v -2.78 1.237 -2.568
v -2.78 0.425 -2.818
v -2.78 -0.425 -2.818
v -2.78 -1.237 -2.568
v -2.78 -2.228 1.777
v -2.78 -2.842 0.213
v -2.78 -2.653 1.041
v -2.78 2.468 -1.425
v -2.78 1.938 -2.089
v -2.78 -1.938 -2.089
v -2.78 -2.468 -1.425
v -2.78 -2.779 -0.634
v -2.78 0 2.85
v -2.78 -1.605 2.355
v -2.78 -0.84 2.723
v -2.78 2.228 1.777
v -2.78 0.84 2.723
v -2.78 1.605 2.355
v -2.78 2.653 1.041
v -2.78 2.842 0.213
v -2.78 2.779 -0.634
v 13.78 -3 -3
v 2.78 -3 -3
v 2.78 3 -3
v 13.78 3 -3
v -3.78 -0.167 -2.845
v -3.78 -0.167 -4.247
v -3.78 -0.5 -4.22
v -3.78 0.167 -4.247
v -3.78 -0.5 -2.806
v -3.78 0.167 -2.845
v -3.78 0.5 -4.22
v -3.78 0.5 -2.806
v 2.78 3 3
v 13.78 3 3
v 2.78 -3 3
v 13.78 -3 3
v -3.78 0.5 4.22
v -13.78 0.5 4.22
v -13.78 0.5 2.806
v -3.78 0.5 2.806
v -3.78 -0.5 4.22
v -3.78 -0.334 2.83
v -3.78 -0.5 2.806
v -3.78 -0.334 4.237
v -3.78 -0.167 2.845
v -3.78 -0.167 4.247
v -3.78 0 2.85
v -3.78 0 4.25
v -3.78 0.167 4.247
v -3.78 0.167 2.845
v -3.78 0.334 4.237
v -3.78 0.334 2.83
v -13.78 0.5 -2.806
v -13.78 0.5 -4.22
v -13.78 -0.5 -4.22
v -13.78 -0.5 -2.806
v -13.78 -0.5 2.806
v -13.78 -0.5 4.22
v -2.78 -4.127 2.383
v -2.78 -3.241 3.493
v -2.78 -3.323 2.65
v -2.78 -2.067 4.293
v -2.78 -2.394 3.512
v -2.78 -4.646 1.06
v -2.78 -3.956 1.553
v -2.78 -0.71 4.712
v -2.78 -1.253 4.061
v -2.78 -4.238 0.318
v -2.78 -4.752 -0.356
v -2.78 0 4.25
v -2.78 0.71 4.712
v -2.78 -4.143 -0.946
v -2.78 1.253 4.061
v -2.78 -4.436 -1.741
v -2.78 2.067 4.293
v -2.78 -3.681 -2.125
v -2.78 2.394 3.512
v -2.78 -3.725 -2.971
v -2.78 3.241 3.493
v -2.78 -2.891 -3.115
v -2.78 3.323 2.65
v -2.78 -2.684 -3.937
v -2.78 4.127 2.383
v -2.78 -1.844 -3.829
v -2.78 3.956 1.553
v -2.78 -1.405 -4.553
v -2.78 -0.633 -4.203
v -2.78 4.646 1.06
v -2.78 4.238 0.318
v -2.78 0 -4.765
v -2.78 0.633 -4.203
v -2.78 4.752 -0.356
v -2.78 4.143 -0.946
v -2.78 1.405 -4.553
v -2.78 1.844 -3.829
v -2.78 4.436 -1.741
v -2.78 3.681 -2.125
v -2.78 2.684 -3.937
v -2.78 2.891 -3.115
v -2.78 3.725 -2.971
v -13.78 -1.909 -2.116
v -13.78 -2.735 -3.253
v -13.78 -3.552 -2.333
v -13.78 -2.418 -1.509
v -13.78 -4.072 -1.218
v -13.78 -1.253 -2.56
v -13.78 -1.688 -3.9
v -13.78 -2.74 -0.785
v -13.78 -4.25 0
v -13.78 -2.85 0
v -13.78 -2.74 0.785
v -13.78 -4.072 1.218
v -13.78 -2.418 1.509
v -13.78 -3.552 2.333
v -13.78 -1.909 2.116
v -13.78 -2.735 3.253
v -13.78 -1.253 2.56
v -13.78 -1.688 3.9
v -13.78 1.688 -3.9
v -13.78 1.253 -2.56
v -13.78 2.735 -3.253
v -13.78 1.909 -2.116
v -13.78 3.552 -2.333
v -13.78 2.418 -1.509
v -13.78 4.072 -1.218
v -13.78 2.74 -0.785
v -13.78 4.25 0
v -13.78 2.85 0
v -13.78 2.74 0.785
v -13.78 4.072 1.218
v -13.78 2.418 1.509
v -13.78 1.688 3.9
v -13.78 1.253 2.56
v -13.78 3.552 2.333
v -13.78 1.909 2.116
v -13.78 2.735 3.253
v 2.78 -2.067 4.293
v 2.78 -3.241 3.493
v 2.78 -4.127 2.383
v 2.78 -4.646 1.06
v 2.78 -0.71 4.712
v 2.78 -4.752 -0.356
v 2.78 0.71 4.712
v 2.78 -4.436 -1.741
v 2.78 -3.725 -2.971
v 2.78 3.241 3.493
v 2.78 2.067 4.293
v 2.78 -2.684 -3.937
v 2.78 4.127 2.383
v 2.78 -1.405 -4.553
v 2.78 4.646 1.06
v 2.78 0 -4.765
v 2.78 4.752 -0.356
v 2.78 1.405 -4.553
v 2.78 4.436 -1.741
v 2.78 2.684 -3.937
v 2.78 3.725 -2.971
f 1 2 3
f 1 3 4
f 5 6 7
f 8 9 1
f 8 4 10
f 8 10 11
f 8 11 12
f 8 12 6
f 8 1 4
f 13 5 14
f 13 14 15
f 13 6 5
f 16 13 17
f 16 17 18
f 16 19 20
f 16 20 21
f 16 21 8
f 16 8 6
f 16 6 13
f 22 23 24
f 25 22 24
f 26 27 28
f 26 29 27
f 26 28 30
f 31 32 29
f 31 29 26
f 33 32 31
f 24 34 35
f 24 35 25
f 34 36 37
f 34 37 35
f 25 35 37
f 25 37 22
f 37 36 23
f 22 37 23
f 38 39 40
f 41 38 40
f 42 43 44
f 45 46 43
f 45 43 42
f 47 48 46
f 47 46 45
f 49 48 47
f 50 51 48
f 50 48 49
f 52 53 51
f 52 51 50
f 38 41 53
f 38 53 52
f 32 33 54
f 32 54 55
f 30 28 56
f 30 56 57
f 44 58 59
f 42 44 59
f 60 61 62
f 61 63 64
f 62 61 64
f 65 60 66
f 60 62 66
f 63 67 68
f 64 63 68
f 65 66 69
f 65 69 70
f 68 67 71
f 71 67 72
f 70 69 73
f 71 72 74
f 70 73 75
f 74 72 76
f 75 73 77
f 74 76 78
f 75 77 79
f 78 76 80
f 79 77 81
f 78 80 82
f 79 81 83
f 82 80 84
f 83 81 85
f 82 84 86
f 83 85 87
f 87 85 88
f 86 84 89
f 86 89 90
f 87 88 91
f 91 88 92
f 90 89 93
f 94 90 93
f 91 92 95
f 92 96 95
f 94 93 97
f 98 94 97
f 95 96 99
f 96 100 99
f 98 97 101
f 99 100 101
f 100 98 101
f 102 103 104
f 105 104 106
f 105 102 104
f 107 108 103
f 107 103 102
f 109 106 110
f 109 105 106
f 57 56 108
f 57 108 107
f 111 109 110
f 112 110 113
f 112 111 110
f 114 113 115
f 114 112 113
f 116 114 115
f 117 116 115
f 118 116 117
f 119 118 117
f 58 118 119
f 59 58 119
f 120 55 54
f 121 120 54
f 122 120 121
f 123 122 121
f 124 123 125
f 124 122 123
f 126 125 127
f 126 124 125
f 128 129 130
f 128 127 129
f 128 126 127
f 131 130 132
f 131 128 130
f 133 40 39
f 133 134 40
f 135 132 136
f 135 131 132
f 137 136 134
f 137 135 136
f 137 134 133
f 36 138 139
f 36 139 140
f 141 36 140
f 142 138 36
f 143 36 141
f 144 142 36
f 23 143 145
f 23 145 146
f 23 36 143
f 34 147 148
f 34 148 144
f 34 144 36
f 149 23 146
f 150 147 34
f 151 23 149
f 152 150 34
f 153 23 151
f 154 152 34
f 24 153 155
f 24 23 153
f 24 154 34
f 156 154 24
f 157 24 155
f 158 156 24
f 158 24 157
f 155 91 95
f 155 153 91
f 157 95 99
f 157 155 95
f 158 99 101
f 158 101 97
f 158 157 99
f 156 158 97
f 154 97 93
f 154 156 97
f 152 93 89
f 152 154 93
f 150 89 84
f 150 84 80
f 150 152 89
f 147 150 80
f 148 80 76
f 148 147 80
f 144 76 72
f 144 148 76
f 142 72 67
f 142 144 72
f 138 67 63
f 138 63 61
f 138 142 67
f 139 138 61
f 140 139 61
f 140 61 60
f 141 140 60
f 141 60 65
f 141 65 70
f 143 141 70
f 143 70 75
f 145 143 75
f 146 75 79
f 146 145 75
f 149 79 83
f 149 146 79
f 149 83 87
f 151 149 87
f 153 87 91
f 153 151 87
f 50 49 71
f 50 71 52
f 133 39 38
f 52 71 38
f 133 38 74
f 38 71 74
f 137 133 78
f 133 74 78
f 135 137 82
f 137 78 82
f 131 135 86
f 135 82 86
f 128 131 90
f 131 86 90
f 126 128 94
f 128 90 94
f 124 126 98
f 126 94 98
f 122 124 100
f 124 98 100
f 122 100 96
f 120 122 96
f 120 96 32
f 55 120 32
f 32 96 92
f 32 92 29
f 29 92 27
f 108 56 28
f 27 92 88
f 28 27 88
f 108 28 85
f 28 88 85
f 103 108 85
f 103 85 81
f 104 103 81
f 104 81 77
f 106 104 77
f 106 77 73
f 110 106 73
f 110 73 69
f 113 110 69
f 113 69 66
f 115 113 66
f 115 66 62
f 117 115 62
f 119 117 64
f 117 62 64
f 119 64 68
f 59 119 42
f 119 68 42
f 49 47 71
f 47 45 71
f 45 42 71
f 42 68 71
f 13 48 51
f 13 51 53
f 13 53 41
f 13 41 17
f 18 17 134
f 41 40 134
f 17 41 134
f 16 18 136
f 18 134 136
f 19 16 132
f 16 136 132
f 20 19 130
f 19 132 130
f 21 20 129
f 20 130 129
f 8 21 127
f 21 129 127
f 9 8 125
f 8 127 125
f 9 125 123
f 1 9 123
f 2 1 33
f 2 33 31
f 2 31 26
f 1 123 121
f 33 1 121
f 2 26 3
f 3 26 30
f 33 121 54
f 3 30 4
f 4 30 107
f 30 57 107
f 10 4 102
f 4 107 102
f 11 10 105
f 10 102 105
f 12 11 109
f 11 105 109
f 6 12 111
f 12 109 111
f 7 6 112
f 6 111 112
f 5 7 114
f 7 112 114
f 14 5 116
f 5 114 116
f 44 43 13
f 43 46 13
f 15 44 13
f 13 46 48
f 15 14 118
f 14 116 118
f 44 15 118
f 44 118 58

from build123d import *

# Parameters (mm, degrees)
SKETCH1_R           = 4.765
BOSS_EXTRUDE1_DEPTH = 2.78
SKETCH2_R           = 4.25
BOSS_EXTRUDE2_DEPTH = 11
SKETCH3_W           = 6
SKETCH3_H           = 6
BOSS_EXTRUDE3_DEPTH = 11
CUT_EXTRUDE1_START  = 11
SKETCH4_R           = 2.85
CUT_EXTRUDE1_DEPTH  = 11
CUT_EXTRUDE2_START  = -10
CUT_EXTRUDE2_DEPTH  = 10


with BuildPart() as part:
    # Sketch1 → Boss-Extrude1 (new, symmetric)
    with BuildSketch(Plane(origin=(0, 0, 0), x_dir=(0, 0, -1), z_dir=(1, 0, 0))):
        Circle(SKETCH1_R)
    extrude(amount=BOSS_EXTRUDE1_DEPTH, both=True)

    # Sketch2 → Boss-Extrude2 (add)
    with BuildSketch(Plane.ZY.offset(2.78)):
        Circle(SKETCH2_R)
    extrude(amount=BOSS_EXTRUDE2_DEPTH)

    # Sketch3 → Boss-Extrude3 (add)
    with BuildSketch(Plane(origin=(2.78, 0, 0), x_dir=(0, 0, -1), z_dir=(1, 0, 0))):
        Rectangle(SKETCH3_W, SKETCH3_H)
    extrude(amount=BOSS_EXTRUDE3_DEPTH)

    # Sketch4 → Cut-Extrude1 (cut)
    with BuildSketch(Plane.ZY.offset(2.78).offset(CUT_EXTRUDE1_START)):
        Circle(SKETCH4_R)
    extrude(amount=-CUT_EXTRUDE1_DEPTH, mode=Mode.SUBTRACT)

    # Sketch5 → Cut-Extrude2 (cut)
    with BuildSketch(Plane.ZY.offset(13.78).offset(CUT_EXTRUDE2_START)):
        with BuildLine():
            ThreePointArc((-4.220485754, 0.5), (-4.25, 0), (-4.220485754, -0.5))
            Line((-4.220485754, -0.5), (-2.805797569, -0.5))
            ThreePointArc((-2.805797569, -0.5), (-2.85, 0), (-2.805797569, 0.5))
            Line((-2.805797569, 0.5), (-4.220485754, 0.5))
        make_face()
        with BuildLine():
            Line((2.805797569, -0.5), (4.220485754, -0.5))
            ThreePointArc((4.220485754, -0.5), (4.242615022, -0.250435167), (4.25, 0))
            ThreePointArc((4.25, 0), (4.242615022, 0.250435167), (4.220485754, 0.5))
            Line((4.220485754, 0.5), (2.805797569, 0.5))
            ThreePointArc((2.805797569, 0.5), (2.838927885, 0.250975026), (2.85, 0))
            ThreePointArc((2.85, 0), (2.838927885, -0.250975026), (2.805797569, -0.5))
        make_face()
        with BuildLine():
            ThreePointArc((-4.73869444, 0.5), (-4.765, 0), (-4.73869444, -0.5))
            Line((-4.73869444, -0.5), (-4.220485754, -0.5))
            ThreePointArc((-4.220485754, -0.5), (-4.25, 0), (-4.220485754, 0.5))
            Line((-4.220485754, 0.5), (-4.73869444, 0.5))
        make_face()
        with BuildLine():
            ThreePointArc((-2.805797569, 0.5), (-2.85, 0), (-2.805797569, -0.5))
            Line((-2.805797569, -0.5), (2.805797569, -0.5))
            ThreePointArc((2.805797569, -0.5), (2.838927885, -0.250975026), (2.85, 0))
            ThreePointArc((2.85, 0), (2.838927885, 0.250975026), (2.805797569, 0.5))
            Line((2.805797569, 0.5), (-2.805797569, 0.5))
        make_face()
        with BuildLine():
            ThreePointArc((4.25, 0), (4.242615022, -0.250435167), (4.220485754, -0.5))
            Line((4.220485754, -0.5), (4.73869444, -0.5))
            ThreePointArc((4.73869444, -0.5), (4.765, 0), (4.73869444, 0.5))
            Line((4.73869444, 0.5), (4.220485754, 0.5))
            ThreePointArc((4.220485754, 0.5), (4.242615022, 0.250435167), (4.25, 0))
        make_face()
    extrude(amount=CUT_EXTRUDE2_DEPTH, mode=Mode.SUBTRACT)


solid = part.part
